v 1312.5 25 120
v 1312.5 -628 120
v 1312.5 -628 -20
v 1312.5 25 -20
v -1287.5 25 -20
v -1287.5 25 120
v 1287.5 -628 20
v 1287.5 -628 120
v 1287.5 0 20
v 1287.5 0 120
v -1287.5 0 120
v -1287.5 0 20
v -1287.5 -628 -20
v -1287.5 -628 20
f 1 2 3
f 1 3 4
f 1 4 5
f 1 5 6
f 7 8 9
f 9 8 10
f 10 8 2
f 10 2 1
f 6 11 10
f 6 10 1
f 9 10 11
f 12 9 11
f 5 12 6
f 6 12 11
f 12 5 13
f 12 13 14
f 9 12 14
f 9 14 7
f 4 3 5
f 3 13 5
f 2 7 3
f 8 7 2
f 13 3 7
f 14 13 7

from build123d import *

# Parameters (mm, degrees)
F0_W     = 2575
F0_H     = 40
F1_DEPTH = 628
F2_W     = 2575
F2_H     = 140
F3_DEPTH = 25
F4_W     = 653
F4_H     = 140
F5_DEPTH = 25


with BuildPart() as f1:
    # F0 (on Front) → F1 (new body)
    with BuildSketch(Plane.XZ):
        Rectangle(F0_W, F0_H)
    extrude(amount=F1_DEPTH)

    # F2 (on face) → F3 (join)
    with BuildSketch(Plane(origin=(0, 0, 0), x_dir=(-1, 0, 0), z_dir=(0, 1, 0))):
        with Locations((0, 50)):
            Rectangle(F2_W, F2_H)
    extrude(amount=F3_DEPTH)

    # F4 (on face) → F5 (join)
    with BuildSketch(Plane.YZ.offset(1287.5)):
        with Locations((-301.5, 50)):
            Rectangle(F4_W, F4_H)
    extrude(amount=F5_DEPTH)


solid = f1.part
